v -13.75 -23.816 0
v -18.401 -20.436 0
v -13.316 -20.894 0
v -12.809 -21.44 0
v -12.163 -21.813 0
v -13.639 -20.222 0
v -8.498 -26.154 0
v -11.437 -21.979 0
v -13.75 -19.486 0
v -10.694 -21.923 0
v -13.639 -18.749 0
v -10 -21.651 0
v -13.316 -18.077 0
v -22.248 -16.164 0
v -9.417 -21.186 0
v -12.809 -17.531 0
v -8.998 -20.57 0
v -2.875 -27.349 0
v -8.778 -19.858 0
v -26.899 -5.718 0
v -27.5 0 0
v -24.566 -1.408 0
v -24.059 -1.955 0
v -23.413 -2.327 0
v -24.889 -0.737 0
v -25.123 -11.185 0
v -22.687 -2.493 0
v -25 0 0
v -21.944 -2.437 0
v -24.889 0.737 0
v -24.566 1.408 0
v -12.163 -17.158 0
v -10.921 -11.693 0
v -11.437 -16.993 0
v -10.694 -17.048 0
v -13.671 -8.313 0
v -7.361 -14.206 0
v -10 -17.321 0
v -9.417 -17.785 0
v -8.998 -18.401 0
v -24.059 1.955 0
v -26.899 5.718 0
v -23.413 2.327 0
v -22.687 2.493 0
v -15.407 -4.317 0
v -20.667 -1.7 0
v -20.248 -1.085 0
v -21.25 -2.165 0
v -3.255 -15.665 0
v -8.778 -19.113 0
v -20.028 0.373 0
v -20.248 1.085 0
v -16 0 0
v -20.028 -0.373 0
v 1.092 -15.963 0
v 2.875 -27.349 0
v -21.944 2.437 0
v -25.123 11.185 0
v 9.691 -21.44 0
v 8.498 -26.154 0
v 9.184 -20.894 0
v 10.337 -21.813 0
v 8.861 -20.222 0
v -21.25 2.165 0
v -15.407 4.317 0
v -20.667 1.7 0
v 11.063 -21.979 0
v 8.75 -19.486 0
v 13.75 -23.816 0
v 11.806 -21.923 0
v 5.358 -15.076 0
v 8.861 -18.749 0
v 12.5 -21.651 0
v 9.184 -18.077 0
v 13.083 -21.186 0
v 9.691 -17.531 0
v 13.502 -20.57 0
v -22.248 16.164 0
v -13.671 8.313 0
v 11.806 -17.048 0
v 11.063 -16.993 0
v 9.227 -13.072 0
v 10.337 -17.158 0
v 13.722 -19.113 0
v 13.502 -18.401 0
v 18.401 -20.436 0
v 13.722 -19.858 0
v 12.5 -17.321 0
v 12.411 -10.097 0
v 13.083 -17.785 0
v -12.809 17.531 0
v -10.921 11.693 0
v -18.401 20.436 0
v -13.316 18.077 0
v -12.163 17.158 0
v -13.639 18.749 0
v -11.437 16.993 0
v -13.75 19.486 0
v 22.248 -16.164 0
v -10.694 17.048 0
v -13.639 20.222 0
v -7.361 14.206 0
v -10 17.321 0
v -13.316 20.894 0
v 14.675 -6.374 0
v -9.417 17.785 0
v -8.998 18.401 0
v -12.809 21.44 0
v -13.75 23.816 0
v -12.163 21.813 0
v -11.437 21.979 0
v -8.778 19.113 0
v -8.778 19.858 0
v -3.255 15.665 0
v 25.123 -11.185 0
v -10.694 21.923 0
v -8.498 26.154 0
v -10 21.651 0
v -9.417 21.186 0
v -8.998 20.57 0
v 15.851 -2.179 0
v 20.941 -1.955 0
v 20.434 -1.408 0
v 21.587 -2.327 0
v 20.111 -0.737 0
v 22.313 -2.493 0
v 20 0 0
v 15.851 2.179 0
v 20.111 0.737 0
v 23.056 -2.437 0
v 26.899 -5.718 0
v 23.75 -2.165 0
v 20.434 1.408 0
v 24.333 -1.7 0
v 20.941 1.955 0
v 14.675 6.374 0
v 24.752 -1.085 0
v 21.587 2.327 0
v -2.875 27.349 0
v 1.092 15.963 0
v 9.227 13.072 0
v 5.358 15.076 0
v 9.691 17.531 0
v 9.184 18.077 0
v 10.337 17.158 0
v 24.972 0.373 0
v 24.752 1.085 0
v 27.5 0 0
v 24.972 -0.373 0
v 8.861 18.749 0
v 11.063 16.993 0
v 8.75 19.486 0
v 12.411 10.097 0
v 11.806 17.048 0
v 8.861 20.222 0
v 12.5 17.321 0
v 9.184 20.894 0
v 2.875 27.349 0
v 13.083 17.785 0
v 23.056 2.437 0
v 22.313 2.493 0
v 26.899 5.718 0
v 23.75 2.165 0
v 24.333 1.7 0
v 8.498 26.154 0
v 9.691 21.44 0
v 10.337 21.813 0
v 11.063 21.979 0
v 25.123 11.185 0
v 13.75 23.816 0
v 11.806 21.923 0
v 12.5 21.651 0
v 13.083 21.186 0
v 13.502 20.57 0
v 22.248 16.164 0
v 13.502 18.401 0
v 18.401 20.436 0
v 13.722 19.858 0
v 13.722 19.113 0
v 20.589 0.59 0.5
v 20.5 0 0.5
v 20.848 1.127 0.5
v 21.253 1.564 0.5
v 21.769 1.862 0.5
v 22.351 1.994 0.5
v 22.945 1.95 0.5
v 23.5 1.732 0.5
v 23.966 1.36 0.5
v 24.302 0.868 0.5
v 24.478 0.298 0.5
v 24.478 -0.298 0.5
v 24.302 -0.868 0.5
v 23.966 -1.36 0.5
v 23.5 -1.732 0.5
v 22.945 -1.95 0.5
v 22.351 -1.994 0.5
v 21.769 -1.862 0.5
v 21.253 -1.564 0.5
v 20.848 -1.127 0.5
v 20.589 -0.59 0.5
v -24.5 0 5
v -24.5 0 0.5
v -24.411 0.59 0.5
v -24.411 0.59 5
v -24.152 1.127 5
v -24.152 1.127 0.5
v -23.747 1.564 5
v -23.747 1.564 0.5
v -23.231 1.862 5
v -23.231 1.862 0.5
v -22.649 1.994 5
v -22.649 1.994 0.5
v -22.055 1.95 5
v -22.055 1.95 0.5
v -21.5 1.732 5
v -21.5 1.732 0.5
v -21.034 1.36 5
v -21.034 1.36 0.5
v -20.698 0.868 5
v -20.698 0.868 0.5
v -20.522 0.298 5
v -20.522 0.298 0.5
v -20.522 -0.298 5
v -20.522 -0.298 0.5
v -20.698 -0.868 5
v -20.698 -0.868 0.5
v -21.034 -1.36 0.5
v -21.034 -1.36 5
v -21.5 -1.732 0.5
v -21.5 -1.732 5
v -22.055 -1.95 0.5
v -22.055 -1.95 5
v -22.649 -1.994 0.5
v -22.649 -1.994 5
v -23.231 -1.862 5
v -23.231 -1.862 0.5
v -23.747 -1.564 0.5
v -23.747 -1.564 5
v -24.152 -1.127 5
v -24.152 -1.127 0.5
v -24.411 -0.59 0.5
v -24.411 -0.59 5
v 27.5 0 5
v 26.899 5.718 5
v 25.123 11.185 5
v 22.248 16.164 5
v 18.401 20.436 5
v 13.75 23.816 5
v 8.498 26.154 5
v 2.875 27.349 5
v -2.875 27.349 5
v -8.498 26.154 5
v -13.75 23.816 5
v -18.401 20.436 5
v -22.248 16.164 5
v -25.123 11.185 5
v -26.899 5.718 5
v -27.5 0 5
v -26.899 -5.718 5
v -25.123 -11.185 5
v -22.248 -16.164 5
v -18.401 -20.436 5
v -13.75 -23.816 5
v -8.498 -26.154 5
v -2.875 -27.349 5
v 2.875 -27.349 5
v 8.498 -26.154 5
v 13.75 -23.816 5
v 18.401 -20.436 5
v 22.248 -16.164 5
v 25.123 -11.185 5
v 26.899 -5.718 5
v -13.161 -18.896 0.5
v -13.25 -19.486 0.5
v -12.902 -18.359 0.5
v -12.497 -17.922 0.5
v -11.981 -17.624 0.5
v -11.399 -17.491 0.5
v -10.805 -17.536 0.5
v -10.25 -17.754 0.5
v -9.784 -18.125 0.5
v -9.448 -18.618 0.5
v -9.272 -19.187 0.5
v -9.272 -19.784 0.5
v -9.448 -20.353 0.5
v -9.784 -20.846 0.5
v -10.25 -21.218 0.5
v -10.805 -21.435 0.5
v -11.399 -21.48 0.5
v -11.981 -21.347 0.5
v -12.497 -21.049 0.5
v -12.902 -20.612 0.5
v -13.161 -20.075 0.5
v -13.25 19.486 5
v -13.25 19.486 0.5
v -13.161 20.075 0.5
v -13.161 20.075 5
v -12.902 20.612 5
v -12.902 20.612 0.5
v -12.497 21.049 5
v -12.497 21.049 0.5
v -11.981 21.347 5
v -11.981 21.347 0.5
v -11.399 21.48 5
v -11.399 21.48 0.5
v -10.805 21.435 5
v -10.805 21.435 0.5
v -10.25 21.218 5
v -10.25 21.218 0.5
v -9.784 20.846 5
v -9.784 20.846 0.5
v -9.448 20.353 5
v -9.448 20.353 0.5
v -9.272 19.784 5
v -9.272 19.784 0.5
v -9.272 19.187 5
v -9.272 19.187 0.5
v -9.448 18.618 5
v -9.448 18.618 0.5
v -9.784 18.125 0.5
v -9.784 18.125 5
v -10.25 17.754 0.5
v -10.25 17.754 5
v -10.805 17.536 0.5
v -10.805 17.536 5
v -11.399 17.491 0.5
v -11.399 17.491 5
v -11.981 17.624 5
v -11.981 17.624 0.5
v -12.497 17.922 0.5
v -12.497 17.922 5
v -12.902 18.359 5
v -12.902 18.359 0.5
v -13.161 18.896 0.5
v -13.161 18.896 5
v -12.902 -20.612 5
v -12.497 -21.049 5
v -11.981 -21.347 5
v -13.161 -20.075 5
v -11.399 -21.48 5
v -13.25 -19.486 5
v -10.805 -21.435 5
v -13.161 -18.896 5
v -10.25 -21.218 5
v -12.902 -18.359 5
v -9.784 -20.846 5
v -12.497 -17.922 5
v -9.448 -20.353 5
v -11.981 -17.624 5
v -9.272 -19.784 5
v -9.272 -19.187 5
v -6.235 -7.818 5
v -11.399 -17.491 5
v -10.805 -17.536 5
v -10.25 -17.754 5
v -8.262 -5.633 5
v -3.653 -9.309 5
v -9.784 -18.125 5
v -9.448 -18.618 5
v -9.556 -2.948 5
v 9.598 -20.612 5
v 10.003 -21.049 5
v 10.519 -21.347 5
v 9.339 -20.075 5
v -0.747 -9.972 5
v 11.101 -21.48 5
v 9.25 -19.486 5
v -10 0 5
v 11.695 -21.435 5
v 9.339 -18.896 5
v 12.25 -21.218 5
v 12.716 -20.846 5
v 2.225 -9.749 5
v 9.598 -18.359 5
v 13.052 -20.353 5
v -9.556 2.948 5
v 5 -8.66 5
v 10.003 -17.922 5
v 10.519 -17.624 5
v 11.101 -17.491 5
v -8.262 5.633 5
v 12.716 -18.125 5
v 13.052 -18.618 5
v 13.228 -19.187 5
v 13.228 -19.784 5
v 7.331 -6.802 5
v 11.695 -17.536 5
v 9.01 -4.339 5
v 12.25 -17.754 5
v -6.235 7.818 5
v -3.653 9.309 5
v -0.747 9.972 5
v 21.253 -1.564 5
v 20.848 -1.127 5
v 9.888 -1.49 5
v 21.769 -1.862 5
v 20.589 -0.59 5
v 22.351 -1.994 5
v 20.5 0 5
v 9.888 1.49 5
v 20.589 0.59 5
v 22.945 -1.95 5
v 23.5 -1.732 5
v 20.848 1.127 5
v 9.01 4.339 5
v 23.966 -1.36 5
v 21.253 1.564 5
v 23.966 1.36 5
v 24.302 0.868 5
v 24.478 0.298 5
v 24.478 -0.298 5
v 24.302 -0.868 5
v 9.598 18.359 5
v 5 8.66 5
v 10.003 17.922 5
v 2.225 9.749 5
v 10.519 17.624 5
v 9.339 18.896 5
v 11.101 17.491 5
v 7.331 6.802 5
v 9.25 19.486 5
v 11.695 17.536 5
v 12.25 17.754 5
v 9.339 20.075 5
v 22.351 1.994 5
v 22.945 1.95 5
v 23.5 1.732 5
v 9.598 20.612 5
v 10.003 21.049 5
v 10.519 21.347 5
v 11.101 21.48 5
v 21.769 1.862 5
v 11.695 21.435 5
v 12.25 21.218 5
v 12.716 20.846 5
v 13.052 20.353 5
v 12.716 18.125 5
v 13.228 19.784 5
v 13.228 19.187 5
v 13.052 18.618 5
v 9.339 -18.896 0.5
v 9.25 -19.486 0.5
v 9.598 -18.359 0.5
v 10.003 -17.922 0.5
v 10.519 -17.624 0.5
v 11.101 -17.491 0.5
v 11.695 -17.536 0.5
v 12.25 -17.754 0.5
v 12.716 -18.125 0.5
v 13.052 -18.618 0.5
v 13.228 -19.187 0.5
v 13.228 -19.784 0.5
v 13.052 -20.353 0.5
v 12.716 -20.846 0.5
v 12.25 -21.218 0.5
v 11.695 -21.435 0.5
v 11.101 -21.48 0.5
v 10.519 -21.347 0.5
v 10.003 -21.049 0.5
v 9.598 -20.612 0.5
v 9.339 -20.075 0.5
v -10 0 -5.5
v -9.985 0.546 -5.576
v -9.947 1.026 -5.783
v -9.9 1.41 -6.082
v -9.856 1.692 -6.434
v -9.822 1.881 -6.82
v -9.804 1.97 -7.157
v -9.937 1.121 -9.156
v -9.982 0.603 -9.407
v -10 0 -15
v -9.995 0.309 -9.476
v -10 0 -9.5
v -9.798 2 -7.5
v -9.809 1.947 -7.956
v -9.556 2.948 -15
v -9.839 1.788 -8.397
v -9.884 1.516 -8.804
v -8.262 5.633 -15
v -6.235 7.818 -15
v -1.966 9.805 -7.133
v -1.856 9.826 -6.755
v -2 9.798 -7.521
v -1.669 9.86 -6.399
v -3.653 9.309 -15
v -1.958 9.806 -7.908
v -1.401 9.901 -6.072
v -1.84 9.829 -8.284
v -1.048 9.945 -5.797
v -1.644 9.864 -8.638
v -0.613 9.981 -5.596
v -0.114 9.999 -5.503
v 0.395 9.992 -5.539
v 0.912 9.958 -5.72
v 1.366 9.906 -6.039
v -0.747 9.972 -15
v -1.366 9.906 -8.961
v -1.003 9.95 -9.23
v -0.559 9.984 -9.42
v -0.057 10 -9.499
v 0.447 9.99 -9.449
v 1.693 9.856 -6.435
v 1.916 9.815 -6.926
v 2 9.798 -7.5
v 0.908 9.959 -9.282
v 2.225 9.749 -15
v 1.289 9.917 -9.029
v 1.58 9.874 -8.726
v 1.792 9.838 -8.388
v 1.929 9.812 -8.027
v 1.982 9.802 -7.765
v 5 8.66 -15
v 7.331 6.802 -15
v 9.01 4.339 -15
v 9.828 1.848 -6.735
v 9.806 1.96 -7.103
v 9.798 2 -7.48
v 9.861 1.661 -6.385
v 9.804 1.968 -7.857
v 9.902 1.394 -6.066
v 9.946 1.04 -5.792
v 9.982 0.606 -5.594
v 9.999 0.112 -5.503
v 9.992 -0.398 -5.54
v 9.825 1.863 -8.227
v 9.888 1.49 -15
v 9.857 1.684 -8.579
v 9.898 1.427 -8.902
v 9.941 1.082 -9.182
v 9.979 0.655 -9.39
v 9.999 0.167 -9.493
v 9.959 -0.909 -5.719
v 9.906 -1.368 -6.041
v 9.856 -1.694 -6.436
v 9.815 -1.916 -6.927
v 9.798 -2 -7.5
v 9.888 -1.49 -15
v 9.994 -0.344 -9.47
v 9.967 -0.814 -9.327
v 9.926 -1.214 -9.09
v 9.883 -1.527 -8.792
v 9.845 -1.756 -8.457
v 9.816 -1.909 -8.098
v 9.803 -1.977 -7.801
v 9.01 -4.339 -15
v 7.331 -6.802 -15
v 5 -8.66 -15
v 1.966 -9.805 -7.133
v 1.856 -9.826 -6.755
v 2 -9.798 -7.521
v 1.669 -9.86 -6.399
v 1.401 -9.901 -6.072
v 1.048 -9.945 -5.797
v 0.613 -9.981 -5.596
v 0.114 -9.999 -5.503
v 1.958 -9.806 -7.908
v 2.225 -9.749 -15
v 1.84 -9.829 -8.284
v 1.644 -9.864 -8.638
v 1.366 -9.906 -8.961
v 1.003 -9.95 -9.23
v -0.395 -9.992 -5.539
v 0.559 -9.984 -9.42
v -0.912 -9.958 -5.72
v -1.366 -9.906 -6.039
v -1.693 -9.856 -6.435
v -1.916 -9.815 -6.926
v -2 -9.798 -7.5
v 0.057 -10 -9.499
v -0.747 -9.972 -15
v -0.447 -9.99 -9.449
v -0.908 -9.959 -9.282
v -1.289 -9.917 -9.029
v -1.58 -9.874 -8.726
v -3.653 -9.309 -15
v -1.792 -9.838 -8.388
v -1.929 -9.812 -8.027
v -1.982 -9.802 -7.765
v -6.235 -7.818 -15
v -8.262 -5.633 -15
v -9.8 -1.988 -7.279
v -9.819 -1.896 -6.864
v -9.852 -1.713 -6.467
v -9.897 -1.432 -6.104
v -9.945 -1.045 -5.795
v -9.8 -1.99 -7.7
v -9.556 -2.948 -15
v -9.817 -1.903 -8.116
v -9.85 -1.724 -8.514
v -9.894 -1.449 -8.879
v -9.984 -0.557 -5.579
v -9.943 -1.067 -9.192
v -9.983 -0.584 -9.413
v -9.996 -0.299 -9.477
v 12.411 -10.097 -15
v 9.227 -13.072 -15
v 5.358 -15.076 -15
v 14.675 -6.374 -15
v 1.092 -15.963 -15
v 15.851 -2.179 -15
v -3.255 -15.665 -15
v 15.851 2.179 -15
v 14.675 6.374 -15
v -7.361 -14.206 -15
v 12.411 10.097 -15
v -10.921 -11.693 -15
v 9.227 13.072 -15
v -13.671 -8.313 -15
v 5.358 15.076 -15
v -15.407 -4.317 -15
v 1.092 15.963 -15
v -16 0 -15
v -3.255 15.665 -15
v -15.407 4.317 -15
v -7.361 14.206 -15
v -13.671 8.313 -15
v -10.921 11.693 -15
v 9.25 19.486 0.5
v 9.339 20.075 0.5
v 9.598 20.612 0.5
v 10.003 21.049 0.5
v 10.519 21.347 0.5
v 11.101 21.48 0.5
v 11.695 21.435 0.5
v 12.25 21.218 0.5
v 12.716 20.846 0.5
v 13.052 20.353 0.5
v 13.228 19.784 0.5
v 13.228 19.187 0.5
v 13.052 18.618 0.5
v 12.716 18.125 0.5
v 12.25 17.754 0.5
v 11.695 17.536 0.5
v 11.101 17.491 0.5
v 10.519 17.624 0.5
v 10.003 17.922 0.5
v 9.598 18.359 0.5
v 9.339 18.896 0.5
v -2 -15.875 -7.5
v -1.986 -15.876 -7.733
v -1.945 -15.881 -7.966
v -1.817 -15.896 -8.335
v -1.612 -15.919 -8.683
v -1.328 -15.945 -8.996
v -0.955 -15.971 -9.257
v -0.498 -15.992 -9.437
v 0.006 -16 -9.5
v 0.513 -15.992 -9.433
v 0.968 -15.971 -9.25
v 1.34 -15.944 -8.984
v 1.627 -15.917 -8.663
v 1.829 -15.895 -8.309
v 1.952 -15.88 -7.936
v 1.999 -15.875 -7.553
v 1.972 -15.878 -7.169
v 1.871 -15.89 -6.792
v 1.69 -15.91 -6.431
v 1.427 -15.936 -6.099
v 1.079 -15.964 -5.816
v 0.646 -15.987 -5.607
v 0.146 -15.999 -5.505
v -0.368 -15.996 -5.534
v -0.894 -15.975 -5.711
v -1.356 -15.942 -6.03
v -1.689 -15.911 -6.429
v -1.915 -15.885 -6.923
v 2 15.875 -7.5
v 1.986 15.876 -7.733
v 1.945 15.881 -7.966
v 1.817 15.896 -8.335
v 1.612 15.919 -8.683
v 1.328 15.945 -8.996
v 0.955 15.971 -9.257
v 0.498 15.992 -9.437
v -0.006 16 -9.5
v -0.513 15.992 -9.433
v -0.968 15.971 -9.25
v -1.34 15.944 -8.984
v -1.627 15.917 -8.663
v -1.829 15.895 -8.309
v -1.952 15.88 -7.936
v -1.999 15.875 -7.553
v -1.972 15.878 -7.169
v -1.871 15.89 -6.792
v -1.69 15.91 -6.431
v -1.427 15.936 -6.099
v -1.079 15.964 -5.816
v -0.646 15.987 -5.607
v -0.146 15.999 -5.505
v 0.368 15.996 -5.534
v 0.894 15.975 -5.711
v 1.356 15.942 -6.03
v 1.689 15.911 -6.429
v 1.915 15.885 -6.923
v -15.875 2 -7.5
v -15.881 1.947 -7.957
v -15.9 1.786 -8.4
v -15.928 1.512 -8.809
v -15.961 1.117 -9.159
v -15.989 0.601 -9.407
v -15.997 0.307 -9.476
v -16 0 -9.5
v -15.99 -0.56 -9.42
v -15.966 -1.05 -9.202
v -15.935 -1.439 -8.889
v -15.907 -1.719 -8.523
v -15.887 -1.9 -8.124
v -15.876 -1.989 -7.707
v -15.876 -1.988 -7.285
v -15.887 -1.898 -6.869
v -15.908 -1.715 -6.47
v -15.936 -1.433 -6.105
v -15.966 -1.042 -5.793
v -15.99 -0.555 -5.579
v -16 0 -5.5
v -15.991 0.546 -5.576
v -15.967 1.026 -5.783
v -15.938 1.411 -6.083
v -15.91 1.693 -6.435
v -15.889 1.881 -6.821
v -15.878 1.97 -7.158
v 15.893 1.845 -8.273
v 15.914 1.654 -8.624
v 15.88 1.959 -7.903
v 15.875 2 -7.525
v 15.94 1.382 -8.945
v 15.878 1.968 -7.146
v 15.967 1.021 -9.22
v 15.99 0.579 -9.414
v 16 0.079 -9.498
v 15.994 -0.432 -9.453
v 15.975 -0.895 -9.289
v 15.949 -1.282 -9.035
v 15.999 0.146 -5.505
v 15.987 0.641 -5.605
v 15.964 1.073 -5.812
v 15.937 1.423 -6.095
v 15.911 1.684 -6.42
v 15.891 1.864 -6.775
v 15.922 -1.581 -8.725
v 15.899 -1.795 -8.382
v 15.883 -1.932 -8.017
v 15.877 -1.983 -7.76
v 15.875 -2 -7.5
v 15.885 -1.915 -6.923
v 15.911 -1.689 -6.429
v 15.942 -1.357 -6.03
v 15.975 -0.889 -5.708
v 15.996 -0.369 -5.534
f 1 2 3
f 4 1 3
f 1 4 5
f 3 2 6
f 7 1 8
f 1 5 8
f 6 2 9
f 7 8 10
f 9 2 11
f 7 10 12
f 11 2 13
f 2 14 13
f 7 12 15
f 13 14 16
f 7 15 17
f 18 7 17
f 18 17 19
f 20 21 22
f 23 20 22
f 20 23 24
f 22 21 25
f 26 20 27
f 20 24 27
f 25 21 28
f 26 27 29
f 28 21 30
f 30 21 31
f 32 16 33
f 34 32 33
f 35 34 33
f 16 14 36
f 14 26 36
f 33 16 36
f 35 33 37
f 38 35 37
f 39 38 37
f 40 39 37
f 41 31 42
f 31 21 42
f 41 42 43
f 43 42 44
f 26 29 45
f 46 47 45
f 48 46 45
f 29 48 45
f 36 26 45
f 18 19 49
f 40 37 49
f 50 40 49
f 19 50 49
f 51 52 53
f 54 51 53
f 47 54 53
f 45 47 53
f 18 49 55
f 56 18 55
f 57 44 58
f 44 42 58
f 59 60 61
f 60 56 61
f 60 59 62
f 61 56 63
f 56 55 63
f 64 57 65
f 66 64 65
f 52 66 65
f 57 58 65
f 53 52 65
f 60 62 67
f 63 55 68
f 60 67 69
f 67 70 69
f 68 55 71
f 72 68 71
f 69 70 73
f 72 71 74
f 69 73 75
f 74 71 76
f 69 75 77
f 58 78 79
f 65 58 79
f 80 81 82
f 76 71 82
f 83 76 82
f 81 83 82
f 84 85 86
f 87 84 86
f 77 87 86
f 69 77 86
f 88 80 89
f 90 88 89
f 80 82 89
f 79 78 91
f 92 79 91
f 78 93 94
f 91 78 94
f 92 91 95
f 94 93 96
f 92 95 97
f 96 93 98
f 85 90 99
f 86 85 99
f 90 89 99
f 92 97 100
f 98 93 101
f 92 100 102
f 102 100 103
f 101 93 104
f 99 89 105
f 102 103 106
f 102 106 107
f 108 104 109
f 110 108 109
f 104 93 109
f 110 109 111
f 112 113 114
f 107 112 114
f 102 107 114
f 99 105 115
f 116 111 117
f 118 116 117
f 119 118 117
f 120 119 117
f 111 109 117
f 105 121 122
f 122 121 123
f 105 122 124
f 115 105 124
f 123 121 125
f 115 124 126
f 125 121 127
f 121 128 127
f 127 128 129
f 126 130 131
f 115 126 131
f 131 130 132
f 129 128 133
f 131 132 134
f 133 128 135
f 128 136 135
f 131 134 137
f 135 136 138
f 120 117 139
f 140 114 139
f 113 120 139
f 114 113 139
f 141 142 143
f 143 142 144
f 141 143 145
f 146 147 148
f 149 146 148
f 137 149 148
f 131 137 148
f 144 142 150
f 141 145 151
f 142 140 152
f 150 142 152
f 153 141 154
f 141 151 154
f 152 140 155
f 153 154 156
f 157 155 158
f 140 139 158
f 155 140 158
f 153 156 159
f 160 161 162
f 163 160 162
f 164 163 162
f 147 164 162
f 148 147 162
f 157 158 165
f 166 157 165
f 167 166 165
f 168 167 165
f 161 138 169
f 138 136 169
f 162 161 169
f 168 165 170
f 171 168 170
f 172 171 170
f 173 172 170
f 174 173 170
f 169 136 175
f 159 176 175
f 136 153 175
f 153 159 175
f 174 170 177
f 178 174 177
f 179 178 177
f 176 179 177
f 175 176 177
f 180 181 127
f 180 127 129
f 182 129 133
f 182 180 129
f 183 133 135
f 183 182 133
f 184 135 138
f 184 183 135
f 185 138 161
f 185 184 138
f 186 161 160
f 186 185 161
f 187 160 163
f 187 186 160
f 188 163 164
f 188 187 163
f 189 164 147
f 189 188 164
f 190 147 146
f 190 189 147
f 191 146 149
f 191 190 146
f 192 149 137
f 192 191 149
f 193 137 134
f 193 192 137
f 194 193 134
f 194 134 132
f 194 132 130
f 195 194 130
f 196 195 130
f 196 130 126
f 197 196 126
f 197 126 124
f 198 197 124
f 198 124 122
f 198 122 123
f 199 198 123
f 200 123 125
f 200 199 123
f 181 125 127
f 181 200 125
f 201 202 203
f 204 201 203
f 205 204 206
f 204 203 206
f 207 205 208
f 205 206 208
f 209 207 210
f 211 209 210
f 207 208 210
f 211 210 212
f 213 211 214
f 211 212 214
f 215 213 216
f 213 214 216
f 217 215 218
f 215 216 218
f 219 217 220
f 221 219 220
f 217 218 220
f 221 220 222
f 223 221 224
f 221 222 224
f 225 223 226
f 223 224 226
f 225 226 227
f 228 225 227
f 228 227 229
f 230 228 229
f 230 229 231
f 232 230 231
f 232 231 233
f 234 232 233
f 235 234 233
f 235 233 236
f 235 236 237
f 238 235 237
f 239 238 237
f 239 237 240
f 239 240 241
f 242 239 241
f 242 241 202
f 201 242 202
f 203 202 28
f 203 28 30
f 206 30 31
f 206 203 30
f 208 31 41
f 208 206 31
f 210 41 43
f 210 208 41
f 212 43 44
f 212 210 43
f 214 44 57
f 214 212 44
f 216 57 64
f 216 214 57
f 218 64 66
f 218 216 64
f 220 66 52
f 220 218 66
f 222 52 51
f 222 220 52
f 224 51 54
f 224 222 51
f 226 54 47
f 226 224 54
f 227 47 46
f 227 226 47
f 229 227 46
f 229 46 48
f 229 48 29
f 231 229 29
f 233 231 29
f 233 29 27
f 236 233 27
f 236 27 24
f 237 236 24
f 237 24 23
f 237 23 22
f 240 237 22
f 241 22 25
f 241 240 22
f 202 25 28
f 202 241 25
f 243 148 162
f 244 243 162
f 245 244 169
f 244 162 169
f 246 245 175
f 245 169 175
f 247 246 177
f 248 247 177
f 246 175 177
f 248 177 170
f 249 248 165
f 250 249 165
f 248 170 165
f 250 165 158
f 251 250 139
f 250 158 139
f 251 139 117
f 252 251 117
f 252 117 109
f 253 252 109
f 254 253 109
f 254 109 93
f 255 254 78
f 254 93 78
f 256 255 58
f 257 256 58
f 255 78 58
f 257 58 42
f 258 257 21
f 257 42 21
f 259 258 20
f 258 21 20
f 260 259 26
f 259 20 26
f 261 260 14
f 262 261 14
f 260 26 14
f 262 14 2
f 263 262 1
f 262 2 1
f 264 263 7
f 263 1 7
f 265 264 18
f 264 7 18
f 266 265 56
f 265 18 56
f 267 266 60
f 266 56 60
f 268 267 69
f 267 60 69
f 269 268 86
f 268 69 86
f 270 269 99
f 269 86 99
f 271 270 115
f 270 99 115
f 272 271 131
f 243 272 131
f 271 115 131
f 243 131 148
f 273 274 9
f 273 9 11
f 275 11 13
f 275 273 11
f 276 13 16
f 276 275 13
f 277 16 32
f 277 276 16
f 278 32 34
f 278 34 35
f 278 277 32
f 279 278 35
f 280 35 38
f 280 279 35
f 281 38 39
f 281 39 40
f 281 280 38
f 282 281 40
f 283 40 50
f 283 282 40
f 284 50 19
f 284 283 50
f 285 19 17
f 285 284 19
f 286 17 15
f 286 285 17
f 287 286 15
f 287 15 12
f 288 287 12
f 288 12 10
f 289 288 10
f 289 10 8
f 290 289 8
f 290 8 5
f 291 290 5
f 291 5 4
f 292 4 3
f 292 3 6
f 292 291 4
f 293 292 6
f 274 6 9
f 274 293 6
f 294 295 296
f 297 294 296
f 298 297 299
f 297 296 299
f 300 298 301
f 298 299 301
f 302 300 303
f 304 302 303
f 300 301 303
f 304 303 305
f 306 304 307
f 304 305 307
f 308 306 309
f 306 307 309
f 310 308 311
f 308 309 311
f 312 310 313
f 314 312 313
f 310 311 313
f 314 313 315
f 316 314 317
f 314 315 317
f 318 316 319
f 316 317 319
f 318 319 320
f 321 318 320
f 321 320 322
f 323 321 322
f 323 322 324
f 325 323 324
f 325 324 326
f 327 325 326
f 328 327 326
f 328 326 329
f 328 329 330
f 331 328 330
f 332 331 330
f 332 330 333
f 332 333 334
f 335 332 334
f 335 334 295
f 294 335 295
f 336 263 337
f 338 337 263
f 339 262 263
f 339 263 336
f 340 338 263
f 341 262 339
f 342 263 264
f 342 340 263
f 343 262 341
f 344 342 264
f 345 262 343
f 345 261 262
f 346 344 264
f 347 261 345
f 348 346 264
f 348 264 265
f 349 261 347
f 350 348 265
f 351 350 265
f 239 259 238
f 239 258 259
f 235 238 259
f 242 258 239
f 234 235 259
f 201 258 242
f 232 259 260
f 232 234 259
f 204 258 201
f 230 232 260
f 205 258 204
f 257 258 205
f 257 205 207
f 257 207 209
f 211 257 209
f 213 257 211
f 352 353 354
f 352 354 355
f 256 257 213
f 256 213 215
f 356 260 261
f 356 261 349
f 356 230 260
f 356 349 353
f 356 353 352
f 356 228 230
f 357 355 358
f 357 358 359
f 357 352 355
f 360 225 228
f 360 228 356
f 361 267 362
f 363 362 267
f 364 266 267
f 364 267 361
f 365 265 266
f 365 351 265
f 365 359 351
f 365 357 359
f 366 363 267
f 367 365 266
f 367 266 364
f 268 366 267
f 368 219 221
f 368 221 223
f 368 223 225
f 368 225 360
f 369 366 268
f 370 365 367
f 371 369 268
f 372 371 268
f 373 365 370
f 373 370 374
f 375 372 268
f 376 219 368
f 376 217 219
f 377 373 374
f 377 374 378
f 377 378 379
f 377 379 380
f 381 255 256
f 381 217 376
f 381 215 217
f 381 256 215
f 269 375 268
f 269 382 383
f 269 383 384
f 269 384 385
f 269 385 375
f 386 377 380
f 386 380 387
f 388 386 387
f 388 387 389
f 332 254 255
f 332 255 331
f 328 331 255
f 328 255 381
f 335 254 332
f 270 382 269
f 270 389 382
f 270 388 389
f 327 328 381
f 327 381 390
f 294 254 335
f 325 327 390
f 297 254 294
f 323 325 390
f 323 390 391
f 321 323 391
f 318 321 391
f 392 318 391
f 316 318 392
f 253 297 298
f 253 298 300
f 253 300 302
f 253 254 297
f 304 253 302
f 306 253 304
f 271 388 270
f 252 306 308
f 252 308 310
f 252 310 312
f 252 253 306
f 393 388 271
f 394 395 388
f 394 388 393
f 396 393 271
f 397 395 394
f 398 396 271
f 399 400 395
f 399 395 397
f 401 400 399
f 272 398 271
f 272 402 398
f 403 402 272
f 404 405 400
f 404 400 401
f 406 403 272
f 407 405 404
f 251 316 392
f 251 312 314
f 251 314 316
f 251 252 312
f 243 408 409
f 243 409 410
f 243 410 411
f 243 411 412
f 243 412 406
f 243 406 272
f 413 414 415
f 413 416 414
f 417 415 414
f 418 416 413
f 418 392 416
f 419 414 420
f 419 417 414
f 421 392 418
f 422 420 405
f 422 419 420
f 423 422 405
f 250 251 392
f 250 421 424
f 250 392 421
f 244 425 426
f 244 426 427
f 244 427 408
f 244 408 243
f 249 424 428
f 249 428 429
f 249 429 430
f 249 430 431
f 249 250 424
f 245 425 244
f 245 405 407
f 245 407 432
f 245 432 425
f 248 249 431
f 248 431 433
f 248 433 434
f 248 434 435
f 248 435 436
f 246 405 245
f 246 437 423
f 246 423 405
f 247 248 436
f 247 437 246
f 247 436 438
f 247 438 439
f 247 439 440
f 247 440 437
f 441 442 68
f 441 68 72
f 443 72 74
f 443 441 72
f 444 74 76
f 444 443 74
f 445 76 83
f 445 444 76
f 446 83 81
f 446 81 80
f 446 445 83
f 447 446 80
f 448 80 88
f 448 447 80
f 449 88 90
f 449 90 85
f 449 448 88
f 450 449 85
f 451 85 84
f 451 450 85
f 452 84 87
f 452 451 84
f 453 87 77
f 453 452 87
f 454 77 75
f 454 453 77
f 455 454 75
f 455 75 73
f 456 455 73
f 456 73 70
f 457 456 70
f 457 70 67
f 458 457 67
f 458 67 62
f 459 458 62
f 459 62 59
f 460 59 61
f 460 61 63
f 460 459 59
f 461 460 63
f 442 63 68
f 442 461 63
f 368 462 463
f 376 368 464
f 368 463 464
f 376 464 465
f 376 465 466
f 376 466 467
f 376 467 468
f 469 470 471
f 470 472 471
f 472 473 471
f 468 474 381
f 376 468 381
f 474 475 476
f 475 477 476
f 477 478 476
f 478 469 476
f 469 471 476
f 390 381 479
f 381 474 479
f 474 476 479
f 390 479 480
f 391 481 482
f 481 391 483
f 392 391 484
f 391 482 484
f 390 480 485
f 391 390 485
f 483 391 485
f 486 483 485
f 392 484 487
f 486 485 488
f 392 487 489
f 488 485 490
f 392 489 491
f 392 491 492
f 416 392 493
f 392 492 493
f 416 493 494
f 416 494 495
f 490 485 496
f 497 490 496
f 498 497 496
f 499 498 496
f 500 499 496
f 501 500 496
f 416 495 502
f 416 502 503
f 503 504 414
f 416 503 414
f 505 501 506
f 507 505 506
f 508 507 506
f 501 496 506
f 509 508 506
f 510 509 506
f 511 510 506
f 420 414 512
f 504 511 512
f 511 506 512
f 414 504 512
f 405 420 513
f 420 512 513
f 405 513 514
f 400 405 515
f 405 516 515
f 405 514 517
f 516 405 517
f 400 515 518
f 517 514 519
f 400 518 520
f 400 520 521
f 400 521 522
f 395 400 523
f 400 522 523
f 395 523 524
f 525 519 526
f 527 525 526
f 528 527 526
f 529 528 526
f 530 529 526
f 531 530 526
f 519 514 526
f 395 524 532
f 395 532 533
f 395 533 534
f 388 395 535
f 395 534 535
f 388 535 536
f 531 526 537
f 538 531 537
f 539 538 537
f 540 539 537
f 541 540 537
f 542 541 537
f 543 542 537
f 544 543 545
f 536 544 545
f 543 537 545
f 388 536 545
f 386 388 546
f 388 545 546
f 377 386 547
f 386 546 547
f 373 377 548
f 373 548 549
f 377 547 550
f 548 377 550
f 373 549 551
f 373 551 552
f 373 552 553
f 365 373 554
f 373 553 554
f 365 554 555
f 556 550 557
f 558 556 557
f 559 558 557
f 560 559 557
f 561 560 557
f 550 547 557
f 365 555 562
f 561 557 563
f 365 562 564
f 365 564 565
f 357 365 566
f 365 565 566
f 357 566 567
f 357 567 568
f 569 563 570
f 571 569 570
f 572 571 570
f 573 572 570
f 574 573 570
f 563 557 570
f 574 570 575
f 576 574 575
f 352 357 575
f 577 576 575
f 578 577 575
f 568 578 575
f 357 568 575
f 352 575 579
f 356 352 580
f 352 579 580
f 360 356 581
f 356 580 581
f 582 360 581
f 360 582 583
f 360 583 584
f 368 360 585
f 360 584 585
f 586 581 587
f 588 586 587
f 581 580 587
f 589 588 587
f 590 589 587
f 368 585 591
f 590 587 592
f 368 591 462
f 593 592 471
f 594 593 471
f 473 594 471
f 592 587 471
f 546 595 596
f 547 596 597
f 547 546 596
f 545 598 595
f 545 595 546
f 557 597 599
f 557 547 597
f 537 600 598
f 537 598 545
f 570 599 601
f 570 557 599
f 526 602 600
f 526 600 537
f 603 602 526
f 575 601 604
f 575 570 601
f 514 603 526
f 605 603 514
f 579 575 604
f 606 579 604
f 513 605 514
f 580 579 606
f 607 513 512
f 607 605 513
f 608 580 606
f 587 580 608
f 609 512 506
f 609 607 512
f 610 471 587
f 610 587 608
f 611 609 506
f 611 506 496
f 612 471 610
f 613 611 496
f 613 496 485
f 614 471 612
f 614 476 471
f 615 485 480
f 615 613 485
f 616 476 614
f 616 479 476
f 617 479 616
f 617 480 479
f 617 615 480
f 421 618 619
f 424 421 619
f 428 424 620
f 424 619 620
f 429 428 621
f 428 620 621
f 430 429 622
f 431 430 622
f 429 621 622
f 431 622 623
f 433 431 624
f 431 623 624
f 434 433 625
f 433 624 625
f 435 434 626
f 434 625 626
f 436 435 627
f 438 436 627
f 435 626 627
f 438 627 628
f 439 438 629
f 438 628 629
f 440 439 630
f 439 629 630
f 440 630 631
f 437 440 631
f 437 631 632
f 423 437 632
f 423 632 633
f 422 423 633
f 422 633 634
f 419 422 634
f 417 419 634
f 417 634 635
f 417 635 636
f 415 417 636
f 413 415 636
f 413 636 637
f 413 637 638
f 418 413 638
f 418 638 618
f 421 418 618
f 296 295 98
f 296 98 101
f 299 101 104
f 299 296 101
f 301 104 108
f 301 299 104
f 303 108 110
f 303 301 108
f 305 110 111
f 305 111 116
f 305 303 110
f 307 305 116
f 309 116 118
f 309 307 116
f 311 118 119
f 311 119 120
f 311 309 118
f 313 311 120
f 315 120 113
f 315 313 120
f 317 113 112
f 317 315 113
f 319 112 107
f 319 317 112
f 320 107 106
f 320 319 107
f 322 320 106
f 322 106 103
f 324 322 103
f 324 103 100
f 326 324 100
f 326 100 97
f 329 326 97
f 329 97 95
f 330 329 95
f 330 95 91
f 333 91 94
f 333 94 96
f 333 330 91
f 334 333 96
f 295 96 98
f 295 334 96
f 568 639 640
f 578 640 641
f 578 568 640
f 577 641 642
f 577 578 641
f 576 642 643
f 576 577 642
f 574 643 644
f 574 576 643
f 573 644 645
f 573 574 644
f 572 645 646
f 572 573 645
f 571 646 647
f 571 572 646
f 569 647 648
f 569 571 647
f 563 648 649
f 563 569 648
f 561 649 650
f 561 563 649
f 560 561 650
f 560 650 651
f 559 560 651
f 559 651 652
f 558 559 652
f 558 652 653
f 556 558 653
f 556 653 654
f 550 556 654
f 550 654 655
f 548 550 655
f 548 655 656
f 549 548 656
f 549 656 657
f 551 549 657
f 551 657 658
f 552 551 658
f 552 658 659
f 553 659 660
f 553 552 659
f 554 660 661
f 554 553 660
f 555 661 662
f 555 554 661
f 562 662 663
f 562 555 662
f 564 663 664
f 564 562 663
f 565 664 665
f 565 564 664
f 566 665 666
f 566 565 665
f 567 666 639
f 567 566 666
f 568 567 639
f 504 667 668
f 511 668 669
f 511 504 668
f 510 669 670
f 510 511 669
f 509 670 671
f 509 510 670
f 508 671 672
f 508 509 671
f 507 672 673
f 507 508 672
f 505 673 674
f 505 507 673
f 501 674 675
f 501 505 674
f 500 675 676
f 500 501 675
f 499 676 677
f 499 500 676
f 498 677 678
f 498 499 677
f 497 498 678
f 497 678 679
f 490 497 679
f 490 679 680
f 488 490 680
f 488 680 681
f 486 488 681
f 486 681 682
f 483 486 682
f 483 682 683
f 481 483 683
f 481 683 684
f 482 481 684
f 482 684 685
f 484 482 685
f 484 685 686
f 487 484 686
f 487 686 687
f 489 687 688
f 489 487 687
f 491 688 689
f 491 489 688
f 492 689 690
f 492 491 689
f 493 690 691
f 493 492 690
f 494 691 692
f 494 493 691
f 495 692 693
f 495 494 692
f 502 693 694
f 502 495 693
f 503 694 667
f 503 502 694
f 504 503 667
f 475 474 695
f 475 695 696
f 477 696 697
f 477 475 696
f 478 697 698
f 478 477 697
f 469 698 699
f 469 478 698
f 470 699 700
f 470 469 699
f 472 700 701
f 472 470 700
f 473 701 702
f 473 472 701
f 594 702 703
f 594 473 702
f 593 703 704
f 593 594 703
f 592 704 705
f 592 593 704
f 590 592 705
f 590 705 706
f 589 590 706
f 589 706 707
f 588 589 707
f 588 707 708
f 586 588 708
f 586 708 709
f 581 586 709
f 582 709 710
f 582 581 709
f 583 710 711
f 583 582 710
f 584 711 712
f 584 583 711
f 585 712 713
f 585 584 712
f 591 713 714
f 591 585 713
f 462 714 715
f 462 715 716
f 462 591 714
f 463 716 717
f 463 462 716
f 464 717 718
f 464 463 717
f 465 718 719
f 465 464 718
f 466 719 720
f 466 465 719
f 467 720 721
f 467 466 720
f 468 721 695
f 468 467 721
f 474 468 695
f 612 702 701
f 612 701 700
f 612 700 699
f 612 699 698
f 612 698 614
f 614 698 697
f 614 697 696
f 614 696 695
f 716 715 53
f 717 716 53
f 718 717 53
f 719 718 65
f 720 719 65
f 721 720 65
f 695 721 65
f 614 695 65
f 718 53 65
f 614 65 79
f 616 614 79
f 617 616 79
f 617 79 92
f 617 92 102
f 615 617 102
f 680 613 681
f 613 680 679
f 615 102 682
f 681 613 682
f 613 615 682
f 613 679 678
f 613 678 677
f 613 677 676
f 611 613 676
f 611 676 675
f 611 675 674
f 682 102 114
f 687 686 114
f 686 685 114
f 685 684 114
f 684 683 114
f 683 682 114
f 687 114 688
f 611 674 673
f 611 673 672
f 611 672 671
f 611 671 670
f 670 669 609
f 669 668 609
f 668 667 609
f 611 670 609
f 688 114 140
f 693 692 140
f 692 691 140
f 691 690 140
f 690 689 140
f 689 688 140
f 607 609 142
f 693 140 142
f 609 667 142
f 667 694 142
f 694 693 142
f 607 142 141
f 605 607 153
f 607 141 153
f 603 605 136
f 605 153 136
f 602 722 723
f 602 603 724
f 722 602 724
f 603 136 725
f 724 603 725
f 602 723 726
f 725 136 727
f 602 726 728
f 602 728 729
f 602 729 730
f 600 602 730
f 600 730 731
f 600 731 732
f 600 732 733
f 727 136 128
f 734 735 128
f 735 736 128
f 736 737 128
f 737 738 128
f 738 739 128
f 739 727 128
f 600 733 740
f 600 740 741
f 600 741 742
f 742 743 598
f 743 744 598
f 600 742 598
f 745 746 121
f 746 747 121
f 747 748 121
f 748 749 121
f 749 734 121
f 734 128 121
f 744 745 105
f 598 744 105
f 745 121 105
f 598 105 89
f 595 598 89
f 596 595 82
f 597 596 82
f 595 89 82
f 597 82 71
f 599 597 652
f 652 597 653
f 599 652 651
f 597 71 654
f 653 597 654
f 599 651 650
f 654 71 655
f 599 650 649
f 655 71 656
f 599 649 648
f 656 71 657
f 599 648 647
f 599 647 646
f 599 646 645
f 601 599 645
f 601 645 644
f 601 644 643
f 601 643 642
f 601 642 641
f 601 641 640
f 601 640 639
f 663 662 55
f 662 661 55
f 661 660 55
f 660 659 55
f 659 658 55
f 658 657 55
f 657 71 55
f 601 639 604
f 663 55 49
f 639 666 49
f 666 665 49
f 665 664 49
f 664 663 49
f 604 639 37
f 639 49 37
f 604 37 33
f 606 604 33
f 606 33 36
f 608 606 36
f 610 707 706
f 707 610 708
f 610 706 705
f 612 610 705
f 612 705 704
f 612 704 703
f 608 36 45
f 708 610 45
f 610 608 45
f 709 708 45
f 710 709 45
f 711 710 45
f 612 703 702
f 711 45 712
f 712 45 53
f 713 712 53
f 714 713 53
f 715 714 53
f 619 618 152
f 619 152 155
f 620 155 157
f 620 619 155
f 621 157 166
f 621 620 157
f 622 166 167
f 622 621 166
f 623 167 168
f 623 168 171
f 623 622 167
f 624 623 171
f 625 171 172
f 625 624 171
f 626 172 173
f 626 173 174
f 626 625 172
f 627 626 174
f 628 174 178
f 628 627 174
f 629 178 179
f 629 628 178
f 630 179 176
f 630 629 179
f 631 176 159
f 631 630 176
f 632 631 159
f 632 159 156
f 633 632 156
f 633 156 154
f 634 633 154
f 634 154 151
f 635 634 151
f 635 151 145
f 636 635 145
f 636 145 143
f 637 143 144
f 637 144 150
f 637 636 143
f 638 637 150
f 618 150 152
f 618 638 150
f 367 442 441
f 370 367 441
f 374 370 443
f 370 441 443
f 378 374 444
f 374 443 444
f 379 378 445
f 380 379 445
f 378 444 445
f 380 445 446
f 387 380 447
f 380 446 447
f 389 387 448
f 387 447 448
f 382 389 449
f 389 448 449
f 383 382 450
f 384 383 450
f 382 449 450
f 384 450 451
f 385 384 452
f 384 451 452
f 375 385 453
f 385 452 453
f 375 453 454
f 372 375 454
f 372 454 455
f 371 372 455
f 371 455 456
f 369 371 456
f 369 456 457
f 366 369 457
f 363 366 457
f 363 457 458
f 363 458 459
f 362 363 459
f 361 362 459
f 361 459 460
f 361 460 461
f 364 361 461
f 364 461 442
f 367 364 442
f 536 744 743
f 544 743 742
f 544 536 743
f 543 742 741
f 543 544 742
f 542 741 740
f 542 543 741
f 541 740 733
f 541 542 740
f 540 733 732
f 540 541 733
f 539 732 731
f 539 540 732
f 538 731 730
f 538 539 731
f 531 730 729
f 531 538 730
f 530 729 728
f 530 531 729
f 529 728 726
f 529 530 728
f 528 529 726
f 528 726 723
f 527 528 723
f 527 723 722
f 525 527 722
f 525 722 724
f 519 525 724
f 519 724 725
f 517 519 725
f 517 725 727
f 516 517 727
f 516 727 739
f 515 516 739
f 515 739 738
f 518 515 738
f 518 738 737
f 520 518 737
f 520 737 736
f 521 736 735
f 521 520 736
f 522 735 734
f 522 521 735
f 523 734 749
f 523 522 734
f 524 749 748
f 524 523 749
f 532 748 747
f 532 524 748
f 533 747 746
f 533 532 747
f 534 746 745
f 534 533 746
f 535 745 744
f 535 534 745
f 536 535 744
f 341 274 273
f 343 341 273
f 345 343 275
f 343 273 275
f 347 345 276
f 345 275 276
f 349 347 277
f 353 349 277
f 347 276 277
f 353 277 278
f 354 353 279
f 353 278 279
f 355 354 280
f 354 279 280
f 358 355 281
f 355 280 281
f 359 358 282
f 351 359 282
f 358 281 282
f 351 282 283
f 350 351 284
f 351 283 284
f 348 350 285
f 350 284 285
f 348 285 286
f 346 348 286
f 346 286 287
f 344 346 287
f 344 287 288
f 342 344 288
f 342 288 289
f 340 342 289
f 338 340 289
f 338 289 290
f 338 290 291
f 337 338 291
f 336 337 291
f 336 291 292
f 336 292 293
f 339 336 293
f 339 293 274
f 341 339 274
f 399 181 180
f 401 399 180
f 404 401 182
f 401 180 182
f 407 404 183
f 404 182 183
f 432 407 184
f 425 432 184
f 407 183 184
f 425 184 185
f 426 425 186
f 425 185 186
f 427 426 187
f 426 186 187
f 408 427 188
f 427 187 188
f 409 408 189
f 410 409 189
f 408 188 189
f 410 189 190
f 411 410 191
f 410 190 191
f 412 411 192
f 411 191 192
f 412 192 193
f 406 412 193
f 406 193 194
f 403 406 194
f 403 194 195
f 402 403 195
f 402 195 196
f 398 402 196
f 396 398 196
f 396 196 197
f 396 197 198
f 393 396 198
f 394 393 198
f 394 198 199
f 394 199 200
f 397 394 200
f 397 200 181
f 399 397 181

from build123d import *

# Parameters (mm, degrees)
SKETCH_1_R               = 27.5
EXTRUDE_1_DEPTH          = 5
SKETCH_2_R               = 10
CUT_EXTRUDE_2_DEPTH      = 40.210967853
EXTRUDE_START            = 15
SKETCH_2_12_R            = 16
SKETCH_2_12_R_2          = 10
EXTRUDE_9_DEPTH          = 15
SKETCH_12_R              = 2
CUT_EXTRUDE_3_DEPTH      = 42.683330001
CHAMFER_1_SIZE           = 0.5
CUT_EXTRUDE_4_REACH      = 55.605
SKETCH_13_R              = 2
PATTERN_CIRCULAR_1_COUNT = 4


with BuildPart() as part:
    # Эскиз1 → Бобышка-Вытянуть1 (new body)
    with BuildSketch(Plane.XY):
        Circle(SKETCH_1_R)
    extrude(amount=EXTRUDE_1_DEPTH)

    # Эскиз2 → Вырез-Вытянуть2 (cut, through all)
    with BuildSketch(Plane(origin=(0, 0, 0), x_dir=(-1, 0, 0), z_dir=(0, 0, -1))):
        Circle(SKETCH_2_R)
    extrude(amount=-CUT_EXTRUDE_2_DEPTH, mode=Mode.SUBTRACT)

    # Эскиз2<12> → Бобышка-Вытянуть9 (add)
    with BuildSketch(Plane(origin=(0, 0, 0), x_dir=(-1, 0, 0), z_dir=(0, 0, -1)).offset(EXTRUDE_START)):
        Circle(SKETCH_2_12_R)
        Circle(SKETCH_2_12_R_2, mode=Mode.SUBTRACT)
    extrude(amount=-EXTRUDE_9_DEPTH)

    # Эскиз12 → Вырез-Вытянуть3 (cut, through all)
    with BuildSketch(Plane(origin=(0, 0, 0), x_dir=(-1, 0, 0), z_dir=(0, 0, -1))):
        with Locations((-22.5, 0)):
            Circle(SKETCH_12_R)
        with Locations((-11.25, 19.485571585)):
            Circle(SKETCH_12_R)
        with Locations((11.25, 19.485571585)):
            Circle(SKETCH_12_R)
        with Locations((22.5, 0)):
            Circle(SKETCH_12_R)
        with Locations((11.25, -19.485571585)):
            Circle(SKETCH_12_R)
        with Locations((-11.25, -19.485571585)):
            Circle(SKETCH_12_R)
    extrude(amount=-CUT_EXTRUDE_3_DEPTH, mode=Mode.SUBTRACT)

    # Фаска1
    chamfer_1_edges = [part.edges().sort_by_distance(p)[0] for p in [
        (-20.5, 0, 0),
        (-9.25, -19.485571585, 0),
        (13.25, -19.485571585, 0),
        (24.5, 0, 0),
        (-9.25, 19.485571585, 0),
        (13.25, 19.485571585, 0),
    ]]
    chamfer(chamfer_1_edges, length=CHAMFER_1_SIZE)

    # Эскиз13 → Вырез-Вытянуть4 (cut, up to next)
    with BuildSketch(Plane(origin=(0, 16, 0), x_dir=(1, 0, 0), z_dir=(0, 1, 0)), mode=Mode.PRIVATE) as cut_extrude_4_sk1:
        with Locations((0, 7.5)):
            Circle(SKETCH_13_R)
    cut_extrude_4_tool1 = extrude(cut_extrude_4_sk1.sketch, amount=-CUT_EXTRUDE_4_REACH, mode=Mode.PRIVATE) & part.part
    cut_extrude_4 = cut_extrude_4_tool1.solids().sort_by_distance((0, 16, -7.5))[0]
    add(cut_extrude_4, mode=Mode.SUBTRACT)

    # Круговой массив1: Вырез-Вытянуть4 ×4 about axis
    pattern_circular_1_axis = Axis((0, 0, -15), (0, 0, 1))
    for i in range(1, PATTERN_CIRCULAR_1_COUNT):
        add(cut_extrude_4.rotate(pattern_circular_1_axis, i * 360 / PATTERN_CIRCULAR_1_COUNT), mode=Mode.SUBTRACT)


solid = part.part
